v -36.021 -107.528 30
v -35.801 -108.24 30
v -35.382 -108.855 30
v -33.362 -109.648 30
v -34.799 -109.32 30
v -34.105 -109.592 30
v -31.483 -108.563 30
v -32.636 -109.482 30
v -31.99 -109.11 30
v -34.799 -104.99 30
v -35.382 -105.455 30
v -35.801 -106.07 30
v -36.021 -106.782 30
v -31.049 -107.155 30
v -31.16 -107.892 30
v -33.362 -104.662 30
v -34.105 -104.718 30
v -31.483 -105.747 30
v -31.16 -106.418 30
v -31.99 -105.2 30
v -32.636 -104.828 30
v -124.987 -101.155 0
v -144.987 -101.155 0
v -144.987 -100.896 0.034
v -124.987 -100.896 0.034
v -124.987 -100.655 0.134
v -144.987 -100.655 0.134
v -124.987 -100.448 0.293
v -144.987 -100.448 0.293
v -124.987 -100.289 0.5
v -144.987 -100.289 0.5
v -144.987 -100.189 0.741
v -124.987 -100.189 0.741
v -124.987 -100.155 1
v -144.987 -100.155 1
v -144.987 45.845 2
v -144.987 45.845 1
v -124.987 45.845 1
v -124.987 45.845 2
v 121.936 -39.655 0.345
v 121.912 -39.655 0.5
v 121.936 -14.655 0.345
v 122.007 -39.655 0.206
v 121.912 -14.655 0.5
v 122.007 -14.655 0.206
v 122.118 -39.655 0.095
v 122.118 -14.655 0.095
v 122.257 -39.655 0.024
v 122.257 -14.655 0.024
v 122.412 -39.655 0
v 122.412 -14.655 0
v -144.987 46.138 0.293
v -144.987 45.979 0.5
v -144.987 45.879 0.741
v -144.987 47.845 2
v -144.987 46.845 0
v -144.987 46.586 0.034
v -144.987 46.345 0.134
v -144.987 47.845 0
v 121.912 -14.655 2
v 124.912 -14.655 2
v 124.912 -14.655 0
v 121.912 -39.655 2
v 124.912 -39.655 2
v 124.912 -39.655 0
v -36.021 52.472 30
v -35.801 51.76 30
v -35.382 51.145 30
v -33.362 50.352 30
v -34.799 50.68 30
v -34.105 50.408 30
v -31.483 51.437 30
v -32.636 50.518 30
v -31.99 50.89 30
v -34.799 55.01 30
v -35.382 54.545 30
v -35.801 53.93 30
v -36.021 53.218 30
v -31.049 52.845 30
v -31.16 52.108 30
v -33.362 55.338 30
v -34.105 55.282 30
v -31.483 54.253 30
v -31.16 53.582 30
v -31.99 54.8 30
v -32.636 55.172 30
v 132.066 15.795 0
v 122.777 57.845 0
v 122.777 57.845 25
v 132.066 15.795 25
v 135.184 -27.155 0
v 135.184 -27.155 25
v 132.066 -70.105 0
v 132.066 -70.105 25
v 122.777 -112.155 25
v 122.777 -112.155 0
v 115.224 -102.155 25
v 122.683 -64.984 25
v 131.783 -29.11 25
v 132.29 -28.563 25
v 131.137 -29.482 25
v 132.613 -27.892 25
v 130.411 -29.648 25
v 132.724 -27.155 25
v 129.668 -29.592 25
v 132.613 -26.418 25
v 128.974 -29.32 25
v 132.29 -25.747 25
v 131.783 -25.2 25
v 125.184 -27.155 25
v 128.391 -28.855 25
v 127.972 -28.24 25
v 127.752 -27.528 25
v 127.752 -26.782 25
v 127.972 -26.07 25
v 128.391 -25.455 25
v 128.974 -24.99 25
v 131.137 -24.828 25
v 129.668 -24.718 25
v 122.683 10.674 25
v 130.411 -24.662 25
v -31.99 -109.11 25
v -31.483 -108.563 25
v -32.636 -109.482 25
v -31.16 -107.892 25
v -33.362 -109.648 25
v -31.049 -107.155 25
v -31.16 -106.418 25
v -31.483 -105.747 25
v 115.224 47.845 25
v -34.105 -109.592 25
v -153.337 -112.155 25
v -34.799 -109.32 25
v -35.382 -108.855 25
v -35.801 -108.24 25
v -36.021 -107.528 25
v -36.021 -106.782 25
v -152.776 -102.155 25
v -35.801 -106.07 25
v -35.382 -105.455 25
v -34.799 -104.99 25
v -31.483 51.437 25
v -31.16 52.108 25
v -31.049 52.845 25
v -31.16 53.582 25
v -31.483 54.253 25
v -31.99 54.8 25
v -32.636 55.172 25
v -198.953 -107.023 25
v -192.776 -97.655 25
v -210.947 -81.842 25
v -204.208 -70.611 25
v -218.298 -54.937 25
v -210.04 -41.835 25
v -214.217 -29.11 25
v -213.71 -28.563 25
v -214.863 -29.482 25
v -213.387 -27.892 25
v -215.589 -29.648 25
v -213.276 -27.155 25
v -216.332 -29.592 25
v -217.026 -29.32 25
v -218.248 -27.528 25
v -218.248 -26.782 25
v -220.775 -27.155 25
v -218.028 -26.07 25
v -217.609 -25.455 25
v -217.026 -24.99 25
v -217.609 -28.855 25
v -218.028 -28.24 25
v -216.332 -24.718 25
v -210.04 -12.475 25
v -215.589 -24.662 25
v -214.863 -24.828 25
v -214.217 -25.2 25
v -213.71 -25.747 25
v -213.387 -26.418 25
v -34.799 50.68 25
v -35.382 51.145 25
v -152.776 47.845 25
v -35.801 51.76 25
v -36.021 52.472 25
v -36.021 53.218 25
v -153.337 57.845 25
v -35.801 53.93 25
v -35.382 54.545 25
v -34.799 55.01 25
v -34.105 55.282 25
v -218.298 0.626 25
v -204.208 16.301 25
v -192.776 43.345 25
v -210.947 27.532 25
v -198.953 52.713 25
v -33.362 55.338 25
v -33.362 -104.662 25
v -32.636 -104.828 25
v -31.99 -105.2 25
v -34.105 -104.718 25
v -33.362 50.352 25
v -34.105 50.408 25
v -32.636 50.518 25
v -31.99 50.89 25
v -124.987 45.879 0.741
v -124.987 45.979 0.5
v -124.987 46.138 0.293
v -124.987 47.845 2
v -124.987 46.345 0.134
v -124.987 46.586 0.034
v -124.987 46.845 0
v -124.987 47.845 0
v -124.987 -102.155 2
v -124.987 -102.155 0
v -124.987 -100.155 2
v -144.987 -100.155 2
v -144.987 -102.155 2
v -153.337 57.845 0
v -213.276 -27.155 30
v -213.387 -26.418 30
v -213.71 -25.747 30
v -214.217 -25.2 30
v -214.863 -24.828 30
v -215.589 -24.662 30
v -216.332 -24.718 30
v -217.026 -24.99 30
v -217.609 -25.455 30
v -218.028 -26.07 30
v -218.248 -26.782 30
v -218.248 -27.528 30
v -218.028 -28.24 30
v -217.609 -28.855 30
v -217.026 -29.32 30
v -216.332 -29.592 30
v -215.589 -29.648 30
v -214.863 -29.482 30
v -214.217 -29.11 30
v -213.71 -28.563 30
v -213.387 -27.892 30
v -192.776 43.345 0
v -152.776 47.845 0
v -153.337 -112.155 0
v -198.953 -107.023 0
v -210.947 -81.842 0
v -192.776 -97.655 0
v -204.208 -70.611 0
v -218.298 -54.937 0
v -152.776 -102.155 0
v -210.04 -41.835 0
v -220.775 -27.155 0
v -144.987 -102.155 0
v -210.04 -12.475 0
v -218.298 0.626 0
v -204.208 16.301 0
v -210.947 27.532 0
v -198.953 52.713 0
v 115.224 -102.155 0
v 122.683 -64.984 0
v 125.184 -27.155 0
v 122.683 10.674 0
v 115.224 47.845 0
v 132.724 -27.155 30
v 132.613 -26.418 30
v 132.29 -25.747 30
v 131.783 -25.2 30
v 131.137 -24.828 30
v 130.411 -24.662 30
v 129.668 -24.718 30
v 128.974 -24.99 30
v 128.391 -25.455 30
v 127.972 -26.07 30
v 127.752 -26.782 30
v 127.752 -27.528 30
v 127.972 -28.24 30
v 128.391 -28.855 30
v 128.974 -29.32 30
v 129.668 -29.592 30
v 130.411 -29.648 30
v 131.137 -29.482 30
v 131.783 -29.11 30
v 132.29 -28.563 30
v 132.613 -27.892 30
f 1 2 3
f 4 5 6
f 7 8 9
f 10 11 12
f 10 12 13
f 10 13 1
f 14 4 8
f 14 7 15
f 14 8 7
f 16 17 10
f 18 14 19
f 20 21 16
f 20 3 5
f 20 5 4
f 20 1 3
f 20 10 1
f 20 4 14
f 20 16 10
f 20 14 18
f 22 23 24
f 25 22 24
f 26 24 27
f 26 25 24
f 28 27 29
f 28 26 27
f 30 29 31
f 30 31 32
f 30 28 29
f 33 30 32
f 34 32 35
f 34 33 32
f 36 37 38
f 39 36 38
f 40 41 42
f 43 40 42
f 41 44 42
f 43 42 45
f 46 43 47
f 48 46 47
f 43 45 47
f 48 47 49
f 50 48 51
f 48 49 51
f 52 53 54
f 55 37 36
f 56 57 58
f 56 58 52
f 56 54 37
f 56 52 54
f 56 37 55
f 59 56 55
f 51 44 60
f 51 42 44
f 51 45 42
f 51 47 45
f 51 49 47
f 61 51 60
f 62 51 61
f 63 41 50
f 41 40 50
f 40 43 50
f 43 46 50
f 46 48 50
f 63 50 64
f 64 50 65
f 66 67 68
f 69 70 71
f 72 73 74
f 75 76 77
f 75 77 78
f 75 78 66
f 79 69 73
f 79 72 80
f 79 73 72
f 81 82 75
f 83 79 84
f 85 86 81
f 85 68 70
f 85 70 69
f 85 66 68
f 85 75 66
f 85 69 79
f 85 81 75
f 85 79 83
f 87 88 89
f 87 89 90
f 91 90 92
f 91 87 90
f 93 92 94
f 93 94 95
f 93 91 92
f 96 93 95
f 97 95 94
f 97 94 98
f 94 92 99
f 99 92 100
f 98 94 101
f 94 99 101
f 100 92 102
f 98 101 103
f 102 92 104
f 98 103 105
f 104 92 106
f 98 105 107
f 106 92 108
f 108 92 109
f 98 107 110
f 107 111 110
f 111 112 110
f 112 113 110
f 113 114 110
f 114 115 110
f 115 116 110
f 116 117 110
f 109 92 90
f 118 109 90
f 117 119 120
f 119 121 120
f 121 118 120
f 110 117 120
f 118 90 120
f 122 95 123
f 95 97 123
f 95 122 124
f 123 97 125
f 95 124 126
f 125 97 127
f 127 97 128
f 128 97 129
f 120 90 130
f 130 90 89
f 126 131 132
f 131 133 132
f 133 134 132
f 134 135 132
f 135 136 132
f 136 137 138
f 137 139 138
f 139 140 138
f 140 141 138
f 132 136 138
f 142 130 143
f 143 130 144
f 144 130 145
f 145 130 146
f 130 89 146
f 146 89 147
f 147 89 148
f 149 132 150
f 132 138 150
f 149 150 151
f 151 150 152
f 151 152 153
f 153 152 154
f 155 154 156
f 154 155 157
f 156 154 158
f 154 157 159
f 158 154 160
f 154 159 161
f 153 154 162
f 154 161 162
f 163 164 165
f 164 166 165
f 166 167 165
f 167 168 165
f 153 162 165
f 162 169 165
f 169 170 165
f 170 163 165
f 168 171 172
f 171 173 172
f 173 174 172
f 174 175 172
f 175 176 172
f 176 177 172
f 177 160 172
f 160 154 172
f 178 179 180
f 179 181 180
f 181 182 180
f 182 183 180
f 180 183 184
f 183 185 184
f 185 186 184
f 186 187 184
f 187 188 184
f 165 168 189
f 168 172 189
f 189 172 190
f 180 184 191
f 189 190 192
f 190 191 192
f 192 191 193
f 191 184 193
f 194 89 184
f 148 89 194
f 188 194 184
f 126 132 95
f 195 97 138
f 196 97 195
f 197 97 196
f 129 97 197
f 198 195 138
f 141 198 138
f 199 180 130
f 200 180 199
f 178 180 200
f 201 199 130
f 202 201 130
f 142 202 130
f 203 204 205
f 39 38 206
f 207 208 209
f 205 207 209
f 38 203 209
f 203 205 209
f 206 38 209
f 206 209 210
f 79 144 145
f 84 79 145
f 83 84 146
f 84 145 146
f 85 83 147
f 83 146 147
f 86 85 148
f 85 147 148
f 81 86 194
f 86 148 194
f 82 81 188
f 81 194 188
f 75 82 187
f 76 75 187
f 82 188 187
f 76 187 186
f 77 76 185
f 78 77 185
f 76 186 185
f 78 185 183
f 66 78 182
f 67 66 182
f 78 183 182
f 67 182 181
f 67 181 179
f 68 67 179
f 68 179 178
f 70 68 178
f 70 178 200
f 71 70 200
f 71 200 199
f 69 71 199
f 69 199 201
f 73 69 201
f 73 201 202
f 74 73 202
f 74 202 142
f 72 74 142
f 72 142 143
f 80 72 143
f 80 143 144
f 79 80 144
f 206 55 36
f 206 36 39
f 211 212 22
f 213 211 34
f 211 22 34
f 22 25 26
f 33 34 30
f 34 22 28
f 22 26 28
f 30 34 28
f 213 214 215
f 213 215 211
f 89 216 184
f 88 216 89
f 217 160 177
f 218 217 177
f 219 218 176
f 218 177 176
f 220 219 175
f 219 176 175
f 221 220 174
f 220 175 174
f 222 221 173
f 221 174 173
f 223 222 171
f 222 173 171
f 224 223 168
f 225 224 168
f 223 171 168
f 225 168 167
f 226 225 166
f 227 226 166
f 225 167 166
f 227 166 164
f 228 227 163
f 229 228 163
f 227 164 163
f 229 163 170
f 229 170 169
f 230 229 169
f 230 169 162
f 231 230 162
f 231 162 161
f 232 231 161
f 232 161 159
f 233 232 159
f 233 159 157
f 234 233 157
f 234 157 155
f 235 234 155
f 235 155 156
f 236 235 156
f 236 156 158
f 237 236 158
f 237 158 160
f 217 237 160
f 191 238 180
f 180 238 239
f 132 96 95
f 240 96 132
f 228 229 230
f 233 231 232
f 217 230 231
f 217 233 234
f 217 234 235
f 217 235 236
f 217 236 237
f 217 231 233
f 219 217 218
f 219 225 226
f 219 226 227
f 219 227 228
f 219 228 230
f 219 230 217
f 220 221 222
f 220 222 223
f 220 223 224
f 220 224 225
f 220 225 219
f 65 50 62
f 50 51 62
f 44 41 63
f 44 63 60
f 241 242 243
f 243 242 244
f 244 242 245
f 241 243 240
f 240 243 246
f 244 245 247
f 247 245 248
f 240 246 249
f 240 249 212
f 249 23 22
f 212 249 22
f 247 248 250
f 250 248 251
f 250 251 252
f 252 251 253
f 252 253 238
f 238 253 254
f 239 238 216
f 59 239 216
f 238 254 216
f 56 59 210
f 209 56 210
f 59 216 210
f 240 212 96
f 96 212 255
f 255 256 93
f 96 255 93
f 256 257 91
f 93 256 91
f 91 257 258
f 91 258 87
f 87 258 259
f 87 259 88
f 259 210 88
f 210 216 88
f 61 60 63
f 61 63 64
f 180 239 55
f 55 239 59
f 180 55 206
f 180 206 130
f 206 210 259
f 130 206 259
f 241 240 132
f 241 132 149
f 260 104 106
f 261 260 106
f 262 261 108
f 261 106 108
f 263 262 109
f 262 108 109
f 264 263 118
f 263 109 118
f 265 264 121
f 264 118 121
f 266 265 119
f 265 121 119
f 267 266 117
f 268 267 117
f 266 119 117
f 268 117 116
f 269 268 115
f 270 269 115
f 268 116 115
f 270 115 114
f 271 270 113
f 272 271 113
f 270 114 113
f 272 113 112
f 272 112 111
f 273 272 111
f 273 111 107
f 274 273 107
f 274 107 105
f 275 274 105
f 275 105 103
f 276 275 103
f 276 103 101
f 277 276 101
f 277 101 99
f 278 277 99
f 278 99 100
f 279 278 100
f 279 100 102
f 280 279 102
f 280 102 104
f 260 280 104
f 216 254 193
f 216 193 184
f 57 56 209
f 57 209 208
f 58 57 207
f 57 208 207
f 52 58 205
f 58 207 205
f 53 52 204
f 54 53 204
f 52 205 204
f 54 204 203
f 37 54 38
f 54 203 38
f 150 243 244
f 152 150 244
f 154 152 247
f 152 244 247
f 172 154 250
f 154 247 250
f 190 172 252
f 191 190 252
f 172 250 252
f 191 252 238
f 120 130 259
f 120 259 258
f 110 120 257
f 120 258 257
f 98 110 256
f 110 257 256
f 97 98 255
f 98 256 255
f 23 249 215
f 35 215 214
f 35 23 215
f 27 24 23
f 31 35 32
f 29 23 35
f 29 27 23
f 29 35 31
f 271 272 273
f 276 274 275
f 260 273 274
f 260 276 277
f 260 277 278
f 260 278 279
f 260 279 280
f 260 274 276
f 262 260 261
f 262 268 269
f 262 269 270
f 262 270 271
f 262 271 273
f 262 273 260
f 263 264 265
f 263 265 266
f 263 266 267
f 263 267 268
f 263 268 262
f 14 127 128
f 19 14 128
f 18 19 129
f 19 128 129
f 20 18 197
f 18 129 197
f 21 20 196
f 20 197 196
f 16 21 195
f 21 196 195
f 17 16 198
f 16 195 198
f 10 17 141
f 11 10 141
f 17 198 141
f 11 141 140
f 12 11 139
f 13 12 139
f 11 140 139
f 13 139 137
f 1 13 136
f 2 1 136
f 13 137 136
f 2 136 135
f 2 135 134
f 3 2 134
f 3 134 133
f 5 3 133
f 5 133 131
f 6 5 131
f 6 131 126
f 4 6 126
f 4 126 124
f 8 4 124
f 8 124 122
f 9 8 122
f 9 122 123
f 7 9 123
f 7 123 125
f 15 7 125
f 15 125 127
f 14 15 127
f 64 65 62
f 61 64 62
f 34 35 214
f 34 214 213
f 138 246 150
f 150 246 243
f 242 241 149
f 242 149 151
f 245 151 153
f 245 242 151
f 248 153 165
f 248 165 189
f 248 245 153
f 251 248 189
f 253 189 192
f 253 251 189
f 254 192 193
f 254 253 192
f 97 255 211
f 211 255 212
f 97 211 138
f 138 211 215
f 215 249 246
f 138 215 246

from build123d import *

# Parameters (mm, degrees)
EXTRU_MINCE1_DEPTH = 25
ESQUISSE1_13_W     = 3
ESQUISSE1_13_H     = 25
BOSS_EXTRU_1_DEPTH = 2
ESQUISSE1_14_W     = 20
ESQUISSE1_14_H     = 2
BOSS_EXTRU_2_DEPTH = 2
ESQUISSE1_15_W     = 20
ESQUISSE1_15_H     = 2
BOSS_EXTRU_3_DEPTH = 2
CONG_2_R           = 1
CONG_3_R           = 1
CONG_4_R           = 0.5
ESQUISSE1_18_R     = 2.5
BOSS_EXTRU_5_DEPTH = 30
ESQUISSE1_19_R     = 2.5
BOSS_EXTRU_6_DEPTH = 30
ESQUISSE1_20_R     = 2.5
BOSS_EXTRU_7_DEPTH = 30
ESQUISSE1_21_R     = 2.5
BOSS_EXTRU_8_DEPTH = 30


with BuildPart() as part:
    # Esquisse1 → Extru.-Mince1 (new body)
    with BuildSketch(Plane.XY):
        with BuildLine():
            Line((-198.953146912, 52.713133275), (-153.336718001, 57.844981528))
            Line((-153.336718001, 57.844981528), (122.776592962, 57.844981528))
            ThreePointArc((122.776592962, 57.844981528), (135.183889941, -27.155018472), (122.776592962, -112.155018472))
            Line((122.776592962, -112.155018472), (-153.336718001, -112.155018472))
            Line((-153.336718001, -112.155018472), (-198.953146912, -107.02317022))
            ThreePointArc((-198.953146912, -107.02317022), (-220.774609776, -27.155018472), (-198.953146912, 52.713133275))
        make_face()
        with BuildLine():
            Line((-192.775986612, 43.344981528), (-152.775986612, 47.844981528))
            Line((-152.775986612, 47.844981528), (115.224013388, 47.844981528))
            ThreePointArc((115.224013388, 47.844981528), (125.183889941, -27.155018472), (115.224013388, -102.155018472))
            Line((115.224013388, -102.155018472), (-152.775986612, -102.155018472))
            Line((-152.775986612, -102.155018472), (-192.775986612, -97.655018472))
            ThreePointArc((-192.775986612, -97.655018472), (-210.774609776, -27.155018472), (-192.775986612, 43.344981528))
        make_face(mode=Mode.SUBTRACT)
    extrude(amount=EXTRU_MINCE1_DEPTH)

    # Esquisse1<14> → Boss.-Extru.2 (add)
    with BuildSketch(Plane.XY):
        with Locations((-134.987389646, -101.155018472)):
            Rectangle(ESQUISSE1_14_W, ESQUISSE1_14_H)
    extrude(amount=BOSS_EXTRU_2_DEPTH)

    # Esquisse1<15> → Boss.-Extru.3 (add)
    with BuildSketch(Plane.XY):
        with Locations((-134.987389646, 46.844981528)):
            Rectangle(ESQUISSE1_15_W, ESQUISSE1_15_H)
    extrude(amount=BOSS_EXTRU_3_DEPTH)

    # Congé2
    cong_2_edges = [part.edges().sort_by_distance(p)[0] for p in [
        (-134.987389646, 45.844981528, 0),
    ]]
    fillet(cong_2_edges, radius=CONG_2_R)

    # Congé3
    cong_3_edges = [part.edges().sort_by_distance(p)[0] for p in [
        (-134.987389646, -100.155018472, 0),
    ]]
    fillet(cong_3_edges, radius=CONG_3_R)

    # Esquisse1<18> → Boss.-Extru.5 (add)
    with BuildSketch(Plane.XY):
        with Locations((-33.549027095, -107.155018472)):
            Circle(ESQUISSE1_18_R)
    extrude(amount=BOSS_EXTRU_5_DEPTH)

    # Esquisse1<19> → Boss.-Extru.6 (add)
    with BuildSketch(Plane.XY):
        with Locations((-33.549027095, 52.844981528)):
            Circle(ESQUISSE1_19_R)
    extrude(amount=BOSS_EXTRU_6_DEPTH)

    # Esquisse1<20> → Boss.-Extru.7 (add)
    with BuildSketch(Plane.XY):
        with Locations((130.224013388, -27.155018472)):
            Circle(ESQUISSE1_20_R)
    extrude(amount=BOSS_EXTRU_7_DEPTH)

    # Esquisse1<21> → Boss.-Extru.8 (add)
    with BuildSketch(Plane.XY):
        with Locations((-215.775986612, -27.155018472)):
            Circle(ESQUISSE1_21_R)
    extrude(amount=BOSS_EXTRU_8_DEPTH)


with BuildPart() as body_2:
    # Esquisse1<13> → Boss.-Extru.1 (new body)
    with BuildSketch(Plane.XY):
        with Locations((123.411892491, -27.155018472)):
            Rectangle(ESQUISSE1_13_W, ESQUISSE1_13_H)
    extrude(amount=BOSS_EXTRU_1_DEPTH)

    # Congé4
    cong_4_edges = [body_2.edges().sort_by_distance(p)[0] for p in [
        (121.911892491, -27.155018472, 0),
    ]]
    fillet(cong_4_edges, radius=CONG_4_R)


solid = Compound([part.part, body_2.part])
